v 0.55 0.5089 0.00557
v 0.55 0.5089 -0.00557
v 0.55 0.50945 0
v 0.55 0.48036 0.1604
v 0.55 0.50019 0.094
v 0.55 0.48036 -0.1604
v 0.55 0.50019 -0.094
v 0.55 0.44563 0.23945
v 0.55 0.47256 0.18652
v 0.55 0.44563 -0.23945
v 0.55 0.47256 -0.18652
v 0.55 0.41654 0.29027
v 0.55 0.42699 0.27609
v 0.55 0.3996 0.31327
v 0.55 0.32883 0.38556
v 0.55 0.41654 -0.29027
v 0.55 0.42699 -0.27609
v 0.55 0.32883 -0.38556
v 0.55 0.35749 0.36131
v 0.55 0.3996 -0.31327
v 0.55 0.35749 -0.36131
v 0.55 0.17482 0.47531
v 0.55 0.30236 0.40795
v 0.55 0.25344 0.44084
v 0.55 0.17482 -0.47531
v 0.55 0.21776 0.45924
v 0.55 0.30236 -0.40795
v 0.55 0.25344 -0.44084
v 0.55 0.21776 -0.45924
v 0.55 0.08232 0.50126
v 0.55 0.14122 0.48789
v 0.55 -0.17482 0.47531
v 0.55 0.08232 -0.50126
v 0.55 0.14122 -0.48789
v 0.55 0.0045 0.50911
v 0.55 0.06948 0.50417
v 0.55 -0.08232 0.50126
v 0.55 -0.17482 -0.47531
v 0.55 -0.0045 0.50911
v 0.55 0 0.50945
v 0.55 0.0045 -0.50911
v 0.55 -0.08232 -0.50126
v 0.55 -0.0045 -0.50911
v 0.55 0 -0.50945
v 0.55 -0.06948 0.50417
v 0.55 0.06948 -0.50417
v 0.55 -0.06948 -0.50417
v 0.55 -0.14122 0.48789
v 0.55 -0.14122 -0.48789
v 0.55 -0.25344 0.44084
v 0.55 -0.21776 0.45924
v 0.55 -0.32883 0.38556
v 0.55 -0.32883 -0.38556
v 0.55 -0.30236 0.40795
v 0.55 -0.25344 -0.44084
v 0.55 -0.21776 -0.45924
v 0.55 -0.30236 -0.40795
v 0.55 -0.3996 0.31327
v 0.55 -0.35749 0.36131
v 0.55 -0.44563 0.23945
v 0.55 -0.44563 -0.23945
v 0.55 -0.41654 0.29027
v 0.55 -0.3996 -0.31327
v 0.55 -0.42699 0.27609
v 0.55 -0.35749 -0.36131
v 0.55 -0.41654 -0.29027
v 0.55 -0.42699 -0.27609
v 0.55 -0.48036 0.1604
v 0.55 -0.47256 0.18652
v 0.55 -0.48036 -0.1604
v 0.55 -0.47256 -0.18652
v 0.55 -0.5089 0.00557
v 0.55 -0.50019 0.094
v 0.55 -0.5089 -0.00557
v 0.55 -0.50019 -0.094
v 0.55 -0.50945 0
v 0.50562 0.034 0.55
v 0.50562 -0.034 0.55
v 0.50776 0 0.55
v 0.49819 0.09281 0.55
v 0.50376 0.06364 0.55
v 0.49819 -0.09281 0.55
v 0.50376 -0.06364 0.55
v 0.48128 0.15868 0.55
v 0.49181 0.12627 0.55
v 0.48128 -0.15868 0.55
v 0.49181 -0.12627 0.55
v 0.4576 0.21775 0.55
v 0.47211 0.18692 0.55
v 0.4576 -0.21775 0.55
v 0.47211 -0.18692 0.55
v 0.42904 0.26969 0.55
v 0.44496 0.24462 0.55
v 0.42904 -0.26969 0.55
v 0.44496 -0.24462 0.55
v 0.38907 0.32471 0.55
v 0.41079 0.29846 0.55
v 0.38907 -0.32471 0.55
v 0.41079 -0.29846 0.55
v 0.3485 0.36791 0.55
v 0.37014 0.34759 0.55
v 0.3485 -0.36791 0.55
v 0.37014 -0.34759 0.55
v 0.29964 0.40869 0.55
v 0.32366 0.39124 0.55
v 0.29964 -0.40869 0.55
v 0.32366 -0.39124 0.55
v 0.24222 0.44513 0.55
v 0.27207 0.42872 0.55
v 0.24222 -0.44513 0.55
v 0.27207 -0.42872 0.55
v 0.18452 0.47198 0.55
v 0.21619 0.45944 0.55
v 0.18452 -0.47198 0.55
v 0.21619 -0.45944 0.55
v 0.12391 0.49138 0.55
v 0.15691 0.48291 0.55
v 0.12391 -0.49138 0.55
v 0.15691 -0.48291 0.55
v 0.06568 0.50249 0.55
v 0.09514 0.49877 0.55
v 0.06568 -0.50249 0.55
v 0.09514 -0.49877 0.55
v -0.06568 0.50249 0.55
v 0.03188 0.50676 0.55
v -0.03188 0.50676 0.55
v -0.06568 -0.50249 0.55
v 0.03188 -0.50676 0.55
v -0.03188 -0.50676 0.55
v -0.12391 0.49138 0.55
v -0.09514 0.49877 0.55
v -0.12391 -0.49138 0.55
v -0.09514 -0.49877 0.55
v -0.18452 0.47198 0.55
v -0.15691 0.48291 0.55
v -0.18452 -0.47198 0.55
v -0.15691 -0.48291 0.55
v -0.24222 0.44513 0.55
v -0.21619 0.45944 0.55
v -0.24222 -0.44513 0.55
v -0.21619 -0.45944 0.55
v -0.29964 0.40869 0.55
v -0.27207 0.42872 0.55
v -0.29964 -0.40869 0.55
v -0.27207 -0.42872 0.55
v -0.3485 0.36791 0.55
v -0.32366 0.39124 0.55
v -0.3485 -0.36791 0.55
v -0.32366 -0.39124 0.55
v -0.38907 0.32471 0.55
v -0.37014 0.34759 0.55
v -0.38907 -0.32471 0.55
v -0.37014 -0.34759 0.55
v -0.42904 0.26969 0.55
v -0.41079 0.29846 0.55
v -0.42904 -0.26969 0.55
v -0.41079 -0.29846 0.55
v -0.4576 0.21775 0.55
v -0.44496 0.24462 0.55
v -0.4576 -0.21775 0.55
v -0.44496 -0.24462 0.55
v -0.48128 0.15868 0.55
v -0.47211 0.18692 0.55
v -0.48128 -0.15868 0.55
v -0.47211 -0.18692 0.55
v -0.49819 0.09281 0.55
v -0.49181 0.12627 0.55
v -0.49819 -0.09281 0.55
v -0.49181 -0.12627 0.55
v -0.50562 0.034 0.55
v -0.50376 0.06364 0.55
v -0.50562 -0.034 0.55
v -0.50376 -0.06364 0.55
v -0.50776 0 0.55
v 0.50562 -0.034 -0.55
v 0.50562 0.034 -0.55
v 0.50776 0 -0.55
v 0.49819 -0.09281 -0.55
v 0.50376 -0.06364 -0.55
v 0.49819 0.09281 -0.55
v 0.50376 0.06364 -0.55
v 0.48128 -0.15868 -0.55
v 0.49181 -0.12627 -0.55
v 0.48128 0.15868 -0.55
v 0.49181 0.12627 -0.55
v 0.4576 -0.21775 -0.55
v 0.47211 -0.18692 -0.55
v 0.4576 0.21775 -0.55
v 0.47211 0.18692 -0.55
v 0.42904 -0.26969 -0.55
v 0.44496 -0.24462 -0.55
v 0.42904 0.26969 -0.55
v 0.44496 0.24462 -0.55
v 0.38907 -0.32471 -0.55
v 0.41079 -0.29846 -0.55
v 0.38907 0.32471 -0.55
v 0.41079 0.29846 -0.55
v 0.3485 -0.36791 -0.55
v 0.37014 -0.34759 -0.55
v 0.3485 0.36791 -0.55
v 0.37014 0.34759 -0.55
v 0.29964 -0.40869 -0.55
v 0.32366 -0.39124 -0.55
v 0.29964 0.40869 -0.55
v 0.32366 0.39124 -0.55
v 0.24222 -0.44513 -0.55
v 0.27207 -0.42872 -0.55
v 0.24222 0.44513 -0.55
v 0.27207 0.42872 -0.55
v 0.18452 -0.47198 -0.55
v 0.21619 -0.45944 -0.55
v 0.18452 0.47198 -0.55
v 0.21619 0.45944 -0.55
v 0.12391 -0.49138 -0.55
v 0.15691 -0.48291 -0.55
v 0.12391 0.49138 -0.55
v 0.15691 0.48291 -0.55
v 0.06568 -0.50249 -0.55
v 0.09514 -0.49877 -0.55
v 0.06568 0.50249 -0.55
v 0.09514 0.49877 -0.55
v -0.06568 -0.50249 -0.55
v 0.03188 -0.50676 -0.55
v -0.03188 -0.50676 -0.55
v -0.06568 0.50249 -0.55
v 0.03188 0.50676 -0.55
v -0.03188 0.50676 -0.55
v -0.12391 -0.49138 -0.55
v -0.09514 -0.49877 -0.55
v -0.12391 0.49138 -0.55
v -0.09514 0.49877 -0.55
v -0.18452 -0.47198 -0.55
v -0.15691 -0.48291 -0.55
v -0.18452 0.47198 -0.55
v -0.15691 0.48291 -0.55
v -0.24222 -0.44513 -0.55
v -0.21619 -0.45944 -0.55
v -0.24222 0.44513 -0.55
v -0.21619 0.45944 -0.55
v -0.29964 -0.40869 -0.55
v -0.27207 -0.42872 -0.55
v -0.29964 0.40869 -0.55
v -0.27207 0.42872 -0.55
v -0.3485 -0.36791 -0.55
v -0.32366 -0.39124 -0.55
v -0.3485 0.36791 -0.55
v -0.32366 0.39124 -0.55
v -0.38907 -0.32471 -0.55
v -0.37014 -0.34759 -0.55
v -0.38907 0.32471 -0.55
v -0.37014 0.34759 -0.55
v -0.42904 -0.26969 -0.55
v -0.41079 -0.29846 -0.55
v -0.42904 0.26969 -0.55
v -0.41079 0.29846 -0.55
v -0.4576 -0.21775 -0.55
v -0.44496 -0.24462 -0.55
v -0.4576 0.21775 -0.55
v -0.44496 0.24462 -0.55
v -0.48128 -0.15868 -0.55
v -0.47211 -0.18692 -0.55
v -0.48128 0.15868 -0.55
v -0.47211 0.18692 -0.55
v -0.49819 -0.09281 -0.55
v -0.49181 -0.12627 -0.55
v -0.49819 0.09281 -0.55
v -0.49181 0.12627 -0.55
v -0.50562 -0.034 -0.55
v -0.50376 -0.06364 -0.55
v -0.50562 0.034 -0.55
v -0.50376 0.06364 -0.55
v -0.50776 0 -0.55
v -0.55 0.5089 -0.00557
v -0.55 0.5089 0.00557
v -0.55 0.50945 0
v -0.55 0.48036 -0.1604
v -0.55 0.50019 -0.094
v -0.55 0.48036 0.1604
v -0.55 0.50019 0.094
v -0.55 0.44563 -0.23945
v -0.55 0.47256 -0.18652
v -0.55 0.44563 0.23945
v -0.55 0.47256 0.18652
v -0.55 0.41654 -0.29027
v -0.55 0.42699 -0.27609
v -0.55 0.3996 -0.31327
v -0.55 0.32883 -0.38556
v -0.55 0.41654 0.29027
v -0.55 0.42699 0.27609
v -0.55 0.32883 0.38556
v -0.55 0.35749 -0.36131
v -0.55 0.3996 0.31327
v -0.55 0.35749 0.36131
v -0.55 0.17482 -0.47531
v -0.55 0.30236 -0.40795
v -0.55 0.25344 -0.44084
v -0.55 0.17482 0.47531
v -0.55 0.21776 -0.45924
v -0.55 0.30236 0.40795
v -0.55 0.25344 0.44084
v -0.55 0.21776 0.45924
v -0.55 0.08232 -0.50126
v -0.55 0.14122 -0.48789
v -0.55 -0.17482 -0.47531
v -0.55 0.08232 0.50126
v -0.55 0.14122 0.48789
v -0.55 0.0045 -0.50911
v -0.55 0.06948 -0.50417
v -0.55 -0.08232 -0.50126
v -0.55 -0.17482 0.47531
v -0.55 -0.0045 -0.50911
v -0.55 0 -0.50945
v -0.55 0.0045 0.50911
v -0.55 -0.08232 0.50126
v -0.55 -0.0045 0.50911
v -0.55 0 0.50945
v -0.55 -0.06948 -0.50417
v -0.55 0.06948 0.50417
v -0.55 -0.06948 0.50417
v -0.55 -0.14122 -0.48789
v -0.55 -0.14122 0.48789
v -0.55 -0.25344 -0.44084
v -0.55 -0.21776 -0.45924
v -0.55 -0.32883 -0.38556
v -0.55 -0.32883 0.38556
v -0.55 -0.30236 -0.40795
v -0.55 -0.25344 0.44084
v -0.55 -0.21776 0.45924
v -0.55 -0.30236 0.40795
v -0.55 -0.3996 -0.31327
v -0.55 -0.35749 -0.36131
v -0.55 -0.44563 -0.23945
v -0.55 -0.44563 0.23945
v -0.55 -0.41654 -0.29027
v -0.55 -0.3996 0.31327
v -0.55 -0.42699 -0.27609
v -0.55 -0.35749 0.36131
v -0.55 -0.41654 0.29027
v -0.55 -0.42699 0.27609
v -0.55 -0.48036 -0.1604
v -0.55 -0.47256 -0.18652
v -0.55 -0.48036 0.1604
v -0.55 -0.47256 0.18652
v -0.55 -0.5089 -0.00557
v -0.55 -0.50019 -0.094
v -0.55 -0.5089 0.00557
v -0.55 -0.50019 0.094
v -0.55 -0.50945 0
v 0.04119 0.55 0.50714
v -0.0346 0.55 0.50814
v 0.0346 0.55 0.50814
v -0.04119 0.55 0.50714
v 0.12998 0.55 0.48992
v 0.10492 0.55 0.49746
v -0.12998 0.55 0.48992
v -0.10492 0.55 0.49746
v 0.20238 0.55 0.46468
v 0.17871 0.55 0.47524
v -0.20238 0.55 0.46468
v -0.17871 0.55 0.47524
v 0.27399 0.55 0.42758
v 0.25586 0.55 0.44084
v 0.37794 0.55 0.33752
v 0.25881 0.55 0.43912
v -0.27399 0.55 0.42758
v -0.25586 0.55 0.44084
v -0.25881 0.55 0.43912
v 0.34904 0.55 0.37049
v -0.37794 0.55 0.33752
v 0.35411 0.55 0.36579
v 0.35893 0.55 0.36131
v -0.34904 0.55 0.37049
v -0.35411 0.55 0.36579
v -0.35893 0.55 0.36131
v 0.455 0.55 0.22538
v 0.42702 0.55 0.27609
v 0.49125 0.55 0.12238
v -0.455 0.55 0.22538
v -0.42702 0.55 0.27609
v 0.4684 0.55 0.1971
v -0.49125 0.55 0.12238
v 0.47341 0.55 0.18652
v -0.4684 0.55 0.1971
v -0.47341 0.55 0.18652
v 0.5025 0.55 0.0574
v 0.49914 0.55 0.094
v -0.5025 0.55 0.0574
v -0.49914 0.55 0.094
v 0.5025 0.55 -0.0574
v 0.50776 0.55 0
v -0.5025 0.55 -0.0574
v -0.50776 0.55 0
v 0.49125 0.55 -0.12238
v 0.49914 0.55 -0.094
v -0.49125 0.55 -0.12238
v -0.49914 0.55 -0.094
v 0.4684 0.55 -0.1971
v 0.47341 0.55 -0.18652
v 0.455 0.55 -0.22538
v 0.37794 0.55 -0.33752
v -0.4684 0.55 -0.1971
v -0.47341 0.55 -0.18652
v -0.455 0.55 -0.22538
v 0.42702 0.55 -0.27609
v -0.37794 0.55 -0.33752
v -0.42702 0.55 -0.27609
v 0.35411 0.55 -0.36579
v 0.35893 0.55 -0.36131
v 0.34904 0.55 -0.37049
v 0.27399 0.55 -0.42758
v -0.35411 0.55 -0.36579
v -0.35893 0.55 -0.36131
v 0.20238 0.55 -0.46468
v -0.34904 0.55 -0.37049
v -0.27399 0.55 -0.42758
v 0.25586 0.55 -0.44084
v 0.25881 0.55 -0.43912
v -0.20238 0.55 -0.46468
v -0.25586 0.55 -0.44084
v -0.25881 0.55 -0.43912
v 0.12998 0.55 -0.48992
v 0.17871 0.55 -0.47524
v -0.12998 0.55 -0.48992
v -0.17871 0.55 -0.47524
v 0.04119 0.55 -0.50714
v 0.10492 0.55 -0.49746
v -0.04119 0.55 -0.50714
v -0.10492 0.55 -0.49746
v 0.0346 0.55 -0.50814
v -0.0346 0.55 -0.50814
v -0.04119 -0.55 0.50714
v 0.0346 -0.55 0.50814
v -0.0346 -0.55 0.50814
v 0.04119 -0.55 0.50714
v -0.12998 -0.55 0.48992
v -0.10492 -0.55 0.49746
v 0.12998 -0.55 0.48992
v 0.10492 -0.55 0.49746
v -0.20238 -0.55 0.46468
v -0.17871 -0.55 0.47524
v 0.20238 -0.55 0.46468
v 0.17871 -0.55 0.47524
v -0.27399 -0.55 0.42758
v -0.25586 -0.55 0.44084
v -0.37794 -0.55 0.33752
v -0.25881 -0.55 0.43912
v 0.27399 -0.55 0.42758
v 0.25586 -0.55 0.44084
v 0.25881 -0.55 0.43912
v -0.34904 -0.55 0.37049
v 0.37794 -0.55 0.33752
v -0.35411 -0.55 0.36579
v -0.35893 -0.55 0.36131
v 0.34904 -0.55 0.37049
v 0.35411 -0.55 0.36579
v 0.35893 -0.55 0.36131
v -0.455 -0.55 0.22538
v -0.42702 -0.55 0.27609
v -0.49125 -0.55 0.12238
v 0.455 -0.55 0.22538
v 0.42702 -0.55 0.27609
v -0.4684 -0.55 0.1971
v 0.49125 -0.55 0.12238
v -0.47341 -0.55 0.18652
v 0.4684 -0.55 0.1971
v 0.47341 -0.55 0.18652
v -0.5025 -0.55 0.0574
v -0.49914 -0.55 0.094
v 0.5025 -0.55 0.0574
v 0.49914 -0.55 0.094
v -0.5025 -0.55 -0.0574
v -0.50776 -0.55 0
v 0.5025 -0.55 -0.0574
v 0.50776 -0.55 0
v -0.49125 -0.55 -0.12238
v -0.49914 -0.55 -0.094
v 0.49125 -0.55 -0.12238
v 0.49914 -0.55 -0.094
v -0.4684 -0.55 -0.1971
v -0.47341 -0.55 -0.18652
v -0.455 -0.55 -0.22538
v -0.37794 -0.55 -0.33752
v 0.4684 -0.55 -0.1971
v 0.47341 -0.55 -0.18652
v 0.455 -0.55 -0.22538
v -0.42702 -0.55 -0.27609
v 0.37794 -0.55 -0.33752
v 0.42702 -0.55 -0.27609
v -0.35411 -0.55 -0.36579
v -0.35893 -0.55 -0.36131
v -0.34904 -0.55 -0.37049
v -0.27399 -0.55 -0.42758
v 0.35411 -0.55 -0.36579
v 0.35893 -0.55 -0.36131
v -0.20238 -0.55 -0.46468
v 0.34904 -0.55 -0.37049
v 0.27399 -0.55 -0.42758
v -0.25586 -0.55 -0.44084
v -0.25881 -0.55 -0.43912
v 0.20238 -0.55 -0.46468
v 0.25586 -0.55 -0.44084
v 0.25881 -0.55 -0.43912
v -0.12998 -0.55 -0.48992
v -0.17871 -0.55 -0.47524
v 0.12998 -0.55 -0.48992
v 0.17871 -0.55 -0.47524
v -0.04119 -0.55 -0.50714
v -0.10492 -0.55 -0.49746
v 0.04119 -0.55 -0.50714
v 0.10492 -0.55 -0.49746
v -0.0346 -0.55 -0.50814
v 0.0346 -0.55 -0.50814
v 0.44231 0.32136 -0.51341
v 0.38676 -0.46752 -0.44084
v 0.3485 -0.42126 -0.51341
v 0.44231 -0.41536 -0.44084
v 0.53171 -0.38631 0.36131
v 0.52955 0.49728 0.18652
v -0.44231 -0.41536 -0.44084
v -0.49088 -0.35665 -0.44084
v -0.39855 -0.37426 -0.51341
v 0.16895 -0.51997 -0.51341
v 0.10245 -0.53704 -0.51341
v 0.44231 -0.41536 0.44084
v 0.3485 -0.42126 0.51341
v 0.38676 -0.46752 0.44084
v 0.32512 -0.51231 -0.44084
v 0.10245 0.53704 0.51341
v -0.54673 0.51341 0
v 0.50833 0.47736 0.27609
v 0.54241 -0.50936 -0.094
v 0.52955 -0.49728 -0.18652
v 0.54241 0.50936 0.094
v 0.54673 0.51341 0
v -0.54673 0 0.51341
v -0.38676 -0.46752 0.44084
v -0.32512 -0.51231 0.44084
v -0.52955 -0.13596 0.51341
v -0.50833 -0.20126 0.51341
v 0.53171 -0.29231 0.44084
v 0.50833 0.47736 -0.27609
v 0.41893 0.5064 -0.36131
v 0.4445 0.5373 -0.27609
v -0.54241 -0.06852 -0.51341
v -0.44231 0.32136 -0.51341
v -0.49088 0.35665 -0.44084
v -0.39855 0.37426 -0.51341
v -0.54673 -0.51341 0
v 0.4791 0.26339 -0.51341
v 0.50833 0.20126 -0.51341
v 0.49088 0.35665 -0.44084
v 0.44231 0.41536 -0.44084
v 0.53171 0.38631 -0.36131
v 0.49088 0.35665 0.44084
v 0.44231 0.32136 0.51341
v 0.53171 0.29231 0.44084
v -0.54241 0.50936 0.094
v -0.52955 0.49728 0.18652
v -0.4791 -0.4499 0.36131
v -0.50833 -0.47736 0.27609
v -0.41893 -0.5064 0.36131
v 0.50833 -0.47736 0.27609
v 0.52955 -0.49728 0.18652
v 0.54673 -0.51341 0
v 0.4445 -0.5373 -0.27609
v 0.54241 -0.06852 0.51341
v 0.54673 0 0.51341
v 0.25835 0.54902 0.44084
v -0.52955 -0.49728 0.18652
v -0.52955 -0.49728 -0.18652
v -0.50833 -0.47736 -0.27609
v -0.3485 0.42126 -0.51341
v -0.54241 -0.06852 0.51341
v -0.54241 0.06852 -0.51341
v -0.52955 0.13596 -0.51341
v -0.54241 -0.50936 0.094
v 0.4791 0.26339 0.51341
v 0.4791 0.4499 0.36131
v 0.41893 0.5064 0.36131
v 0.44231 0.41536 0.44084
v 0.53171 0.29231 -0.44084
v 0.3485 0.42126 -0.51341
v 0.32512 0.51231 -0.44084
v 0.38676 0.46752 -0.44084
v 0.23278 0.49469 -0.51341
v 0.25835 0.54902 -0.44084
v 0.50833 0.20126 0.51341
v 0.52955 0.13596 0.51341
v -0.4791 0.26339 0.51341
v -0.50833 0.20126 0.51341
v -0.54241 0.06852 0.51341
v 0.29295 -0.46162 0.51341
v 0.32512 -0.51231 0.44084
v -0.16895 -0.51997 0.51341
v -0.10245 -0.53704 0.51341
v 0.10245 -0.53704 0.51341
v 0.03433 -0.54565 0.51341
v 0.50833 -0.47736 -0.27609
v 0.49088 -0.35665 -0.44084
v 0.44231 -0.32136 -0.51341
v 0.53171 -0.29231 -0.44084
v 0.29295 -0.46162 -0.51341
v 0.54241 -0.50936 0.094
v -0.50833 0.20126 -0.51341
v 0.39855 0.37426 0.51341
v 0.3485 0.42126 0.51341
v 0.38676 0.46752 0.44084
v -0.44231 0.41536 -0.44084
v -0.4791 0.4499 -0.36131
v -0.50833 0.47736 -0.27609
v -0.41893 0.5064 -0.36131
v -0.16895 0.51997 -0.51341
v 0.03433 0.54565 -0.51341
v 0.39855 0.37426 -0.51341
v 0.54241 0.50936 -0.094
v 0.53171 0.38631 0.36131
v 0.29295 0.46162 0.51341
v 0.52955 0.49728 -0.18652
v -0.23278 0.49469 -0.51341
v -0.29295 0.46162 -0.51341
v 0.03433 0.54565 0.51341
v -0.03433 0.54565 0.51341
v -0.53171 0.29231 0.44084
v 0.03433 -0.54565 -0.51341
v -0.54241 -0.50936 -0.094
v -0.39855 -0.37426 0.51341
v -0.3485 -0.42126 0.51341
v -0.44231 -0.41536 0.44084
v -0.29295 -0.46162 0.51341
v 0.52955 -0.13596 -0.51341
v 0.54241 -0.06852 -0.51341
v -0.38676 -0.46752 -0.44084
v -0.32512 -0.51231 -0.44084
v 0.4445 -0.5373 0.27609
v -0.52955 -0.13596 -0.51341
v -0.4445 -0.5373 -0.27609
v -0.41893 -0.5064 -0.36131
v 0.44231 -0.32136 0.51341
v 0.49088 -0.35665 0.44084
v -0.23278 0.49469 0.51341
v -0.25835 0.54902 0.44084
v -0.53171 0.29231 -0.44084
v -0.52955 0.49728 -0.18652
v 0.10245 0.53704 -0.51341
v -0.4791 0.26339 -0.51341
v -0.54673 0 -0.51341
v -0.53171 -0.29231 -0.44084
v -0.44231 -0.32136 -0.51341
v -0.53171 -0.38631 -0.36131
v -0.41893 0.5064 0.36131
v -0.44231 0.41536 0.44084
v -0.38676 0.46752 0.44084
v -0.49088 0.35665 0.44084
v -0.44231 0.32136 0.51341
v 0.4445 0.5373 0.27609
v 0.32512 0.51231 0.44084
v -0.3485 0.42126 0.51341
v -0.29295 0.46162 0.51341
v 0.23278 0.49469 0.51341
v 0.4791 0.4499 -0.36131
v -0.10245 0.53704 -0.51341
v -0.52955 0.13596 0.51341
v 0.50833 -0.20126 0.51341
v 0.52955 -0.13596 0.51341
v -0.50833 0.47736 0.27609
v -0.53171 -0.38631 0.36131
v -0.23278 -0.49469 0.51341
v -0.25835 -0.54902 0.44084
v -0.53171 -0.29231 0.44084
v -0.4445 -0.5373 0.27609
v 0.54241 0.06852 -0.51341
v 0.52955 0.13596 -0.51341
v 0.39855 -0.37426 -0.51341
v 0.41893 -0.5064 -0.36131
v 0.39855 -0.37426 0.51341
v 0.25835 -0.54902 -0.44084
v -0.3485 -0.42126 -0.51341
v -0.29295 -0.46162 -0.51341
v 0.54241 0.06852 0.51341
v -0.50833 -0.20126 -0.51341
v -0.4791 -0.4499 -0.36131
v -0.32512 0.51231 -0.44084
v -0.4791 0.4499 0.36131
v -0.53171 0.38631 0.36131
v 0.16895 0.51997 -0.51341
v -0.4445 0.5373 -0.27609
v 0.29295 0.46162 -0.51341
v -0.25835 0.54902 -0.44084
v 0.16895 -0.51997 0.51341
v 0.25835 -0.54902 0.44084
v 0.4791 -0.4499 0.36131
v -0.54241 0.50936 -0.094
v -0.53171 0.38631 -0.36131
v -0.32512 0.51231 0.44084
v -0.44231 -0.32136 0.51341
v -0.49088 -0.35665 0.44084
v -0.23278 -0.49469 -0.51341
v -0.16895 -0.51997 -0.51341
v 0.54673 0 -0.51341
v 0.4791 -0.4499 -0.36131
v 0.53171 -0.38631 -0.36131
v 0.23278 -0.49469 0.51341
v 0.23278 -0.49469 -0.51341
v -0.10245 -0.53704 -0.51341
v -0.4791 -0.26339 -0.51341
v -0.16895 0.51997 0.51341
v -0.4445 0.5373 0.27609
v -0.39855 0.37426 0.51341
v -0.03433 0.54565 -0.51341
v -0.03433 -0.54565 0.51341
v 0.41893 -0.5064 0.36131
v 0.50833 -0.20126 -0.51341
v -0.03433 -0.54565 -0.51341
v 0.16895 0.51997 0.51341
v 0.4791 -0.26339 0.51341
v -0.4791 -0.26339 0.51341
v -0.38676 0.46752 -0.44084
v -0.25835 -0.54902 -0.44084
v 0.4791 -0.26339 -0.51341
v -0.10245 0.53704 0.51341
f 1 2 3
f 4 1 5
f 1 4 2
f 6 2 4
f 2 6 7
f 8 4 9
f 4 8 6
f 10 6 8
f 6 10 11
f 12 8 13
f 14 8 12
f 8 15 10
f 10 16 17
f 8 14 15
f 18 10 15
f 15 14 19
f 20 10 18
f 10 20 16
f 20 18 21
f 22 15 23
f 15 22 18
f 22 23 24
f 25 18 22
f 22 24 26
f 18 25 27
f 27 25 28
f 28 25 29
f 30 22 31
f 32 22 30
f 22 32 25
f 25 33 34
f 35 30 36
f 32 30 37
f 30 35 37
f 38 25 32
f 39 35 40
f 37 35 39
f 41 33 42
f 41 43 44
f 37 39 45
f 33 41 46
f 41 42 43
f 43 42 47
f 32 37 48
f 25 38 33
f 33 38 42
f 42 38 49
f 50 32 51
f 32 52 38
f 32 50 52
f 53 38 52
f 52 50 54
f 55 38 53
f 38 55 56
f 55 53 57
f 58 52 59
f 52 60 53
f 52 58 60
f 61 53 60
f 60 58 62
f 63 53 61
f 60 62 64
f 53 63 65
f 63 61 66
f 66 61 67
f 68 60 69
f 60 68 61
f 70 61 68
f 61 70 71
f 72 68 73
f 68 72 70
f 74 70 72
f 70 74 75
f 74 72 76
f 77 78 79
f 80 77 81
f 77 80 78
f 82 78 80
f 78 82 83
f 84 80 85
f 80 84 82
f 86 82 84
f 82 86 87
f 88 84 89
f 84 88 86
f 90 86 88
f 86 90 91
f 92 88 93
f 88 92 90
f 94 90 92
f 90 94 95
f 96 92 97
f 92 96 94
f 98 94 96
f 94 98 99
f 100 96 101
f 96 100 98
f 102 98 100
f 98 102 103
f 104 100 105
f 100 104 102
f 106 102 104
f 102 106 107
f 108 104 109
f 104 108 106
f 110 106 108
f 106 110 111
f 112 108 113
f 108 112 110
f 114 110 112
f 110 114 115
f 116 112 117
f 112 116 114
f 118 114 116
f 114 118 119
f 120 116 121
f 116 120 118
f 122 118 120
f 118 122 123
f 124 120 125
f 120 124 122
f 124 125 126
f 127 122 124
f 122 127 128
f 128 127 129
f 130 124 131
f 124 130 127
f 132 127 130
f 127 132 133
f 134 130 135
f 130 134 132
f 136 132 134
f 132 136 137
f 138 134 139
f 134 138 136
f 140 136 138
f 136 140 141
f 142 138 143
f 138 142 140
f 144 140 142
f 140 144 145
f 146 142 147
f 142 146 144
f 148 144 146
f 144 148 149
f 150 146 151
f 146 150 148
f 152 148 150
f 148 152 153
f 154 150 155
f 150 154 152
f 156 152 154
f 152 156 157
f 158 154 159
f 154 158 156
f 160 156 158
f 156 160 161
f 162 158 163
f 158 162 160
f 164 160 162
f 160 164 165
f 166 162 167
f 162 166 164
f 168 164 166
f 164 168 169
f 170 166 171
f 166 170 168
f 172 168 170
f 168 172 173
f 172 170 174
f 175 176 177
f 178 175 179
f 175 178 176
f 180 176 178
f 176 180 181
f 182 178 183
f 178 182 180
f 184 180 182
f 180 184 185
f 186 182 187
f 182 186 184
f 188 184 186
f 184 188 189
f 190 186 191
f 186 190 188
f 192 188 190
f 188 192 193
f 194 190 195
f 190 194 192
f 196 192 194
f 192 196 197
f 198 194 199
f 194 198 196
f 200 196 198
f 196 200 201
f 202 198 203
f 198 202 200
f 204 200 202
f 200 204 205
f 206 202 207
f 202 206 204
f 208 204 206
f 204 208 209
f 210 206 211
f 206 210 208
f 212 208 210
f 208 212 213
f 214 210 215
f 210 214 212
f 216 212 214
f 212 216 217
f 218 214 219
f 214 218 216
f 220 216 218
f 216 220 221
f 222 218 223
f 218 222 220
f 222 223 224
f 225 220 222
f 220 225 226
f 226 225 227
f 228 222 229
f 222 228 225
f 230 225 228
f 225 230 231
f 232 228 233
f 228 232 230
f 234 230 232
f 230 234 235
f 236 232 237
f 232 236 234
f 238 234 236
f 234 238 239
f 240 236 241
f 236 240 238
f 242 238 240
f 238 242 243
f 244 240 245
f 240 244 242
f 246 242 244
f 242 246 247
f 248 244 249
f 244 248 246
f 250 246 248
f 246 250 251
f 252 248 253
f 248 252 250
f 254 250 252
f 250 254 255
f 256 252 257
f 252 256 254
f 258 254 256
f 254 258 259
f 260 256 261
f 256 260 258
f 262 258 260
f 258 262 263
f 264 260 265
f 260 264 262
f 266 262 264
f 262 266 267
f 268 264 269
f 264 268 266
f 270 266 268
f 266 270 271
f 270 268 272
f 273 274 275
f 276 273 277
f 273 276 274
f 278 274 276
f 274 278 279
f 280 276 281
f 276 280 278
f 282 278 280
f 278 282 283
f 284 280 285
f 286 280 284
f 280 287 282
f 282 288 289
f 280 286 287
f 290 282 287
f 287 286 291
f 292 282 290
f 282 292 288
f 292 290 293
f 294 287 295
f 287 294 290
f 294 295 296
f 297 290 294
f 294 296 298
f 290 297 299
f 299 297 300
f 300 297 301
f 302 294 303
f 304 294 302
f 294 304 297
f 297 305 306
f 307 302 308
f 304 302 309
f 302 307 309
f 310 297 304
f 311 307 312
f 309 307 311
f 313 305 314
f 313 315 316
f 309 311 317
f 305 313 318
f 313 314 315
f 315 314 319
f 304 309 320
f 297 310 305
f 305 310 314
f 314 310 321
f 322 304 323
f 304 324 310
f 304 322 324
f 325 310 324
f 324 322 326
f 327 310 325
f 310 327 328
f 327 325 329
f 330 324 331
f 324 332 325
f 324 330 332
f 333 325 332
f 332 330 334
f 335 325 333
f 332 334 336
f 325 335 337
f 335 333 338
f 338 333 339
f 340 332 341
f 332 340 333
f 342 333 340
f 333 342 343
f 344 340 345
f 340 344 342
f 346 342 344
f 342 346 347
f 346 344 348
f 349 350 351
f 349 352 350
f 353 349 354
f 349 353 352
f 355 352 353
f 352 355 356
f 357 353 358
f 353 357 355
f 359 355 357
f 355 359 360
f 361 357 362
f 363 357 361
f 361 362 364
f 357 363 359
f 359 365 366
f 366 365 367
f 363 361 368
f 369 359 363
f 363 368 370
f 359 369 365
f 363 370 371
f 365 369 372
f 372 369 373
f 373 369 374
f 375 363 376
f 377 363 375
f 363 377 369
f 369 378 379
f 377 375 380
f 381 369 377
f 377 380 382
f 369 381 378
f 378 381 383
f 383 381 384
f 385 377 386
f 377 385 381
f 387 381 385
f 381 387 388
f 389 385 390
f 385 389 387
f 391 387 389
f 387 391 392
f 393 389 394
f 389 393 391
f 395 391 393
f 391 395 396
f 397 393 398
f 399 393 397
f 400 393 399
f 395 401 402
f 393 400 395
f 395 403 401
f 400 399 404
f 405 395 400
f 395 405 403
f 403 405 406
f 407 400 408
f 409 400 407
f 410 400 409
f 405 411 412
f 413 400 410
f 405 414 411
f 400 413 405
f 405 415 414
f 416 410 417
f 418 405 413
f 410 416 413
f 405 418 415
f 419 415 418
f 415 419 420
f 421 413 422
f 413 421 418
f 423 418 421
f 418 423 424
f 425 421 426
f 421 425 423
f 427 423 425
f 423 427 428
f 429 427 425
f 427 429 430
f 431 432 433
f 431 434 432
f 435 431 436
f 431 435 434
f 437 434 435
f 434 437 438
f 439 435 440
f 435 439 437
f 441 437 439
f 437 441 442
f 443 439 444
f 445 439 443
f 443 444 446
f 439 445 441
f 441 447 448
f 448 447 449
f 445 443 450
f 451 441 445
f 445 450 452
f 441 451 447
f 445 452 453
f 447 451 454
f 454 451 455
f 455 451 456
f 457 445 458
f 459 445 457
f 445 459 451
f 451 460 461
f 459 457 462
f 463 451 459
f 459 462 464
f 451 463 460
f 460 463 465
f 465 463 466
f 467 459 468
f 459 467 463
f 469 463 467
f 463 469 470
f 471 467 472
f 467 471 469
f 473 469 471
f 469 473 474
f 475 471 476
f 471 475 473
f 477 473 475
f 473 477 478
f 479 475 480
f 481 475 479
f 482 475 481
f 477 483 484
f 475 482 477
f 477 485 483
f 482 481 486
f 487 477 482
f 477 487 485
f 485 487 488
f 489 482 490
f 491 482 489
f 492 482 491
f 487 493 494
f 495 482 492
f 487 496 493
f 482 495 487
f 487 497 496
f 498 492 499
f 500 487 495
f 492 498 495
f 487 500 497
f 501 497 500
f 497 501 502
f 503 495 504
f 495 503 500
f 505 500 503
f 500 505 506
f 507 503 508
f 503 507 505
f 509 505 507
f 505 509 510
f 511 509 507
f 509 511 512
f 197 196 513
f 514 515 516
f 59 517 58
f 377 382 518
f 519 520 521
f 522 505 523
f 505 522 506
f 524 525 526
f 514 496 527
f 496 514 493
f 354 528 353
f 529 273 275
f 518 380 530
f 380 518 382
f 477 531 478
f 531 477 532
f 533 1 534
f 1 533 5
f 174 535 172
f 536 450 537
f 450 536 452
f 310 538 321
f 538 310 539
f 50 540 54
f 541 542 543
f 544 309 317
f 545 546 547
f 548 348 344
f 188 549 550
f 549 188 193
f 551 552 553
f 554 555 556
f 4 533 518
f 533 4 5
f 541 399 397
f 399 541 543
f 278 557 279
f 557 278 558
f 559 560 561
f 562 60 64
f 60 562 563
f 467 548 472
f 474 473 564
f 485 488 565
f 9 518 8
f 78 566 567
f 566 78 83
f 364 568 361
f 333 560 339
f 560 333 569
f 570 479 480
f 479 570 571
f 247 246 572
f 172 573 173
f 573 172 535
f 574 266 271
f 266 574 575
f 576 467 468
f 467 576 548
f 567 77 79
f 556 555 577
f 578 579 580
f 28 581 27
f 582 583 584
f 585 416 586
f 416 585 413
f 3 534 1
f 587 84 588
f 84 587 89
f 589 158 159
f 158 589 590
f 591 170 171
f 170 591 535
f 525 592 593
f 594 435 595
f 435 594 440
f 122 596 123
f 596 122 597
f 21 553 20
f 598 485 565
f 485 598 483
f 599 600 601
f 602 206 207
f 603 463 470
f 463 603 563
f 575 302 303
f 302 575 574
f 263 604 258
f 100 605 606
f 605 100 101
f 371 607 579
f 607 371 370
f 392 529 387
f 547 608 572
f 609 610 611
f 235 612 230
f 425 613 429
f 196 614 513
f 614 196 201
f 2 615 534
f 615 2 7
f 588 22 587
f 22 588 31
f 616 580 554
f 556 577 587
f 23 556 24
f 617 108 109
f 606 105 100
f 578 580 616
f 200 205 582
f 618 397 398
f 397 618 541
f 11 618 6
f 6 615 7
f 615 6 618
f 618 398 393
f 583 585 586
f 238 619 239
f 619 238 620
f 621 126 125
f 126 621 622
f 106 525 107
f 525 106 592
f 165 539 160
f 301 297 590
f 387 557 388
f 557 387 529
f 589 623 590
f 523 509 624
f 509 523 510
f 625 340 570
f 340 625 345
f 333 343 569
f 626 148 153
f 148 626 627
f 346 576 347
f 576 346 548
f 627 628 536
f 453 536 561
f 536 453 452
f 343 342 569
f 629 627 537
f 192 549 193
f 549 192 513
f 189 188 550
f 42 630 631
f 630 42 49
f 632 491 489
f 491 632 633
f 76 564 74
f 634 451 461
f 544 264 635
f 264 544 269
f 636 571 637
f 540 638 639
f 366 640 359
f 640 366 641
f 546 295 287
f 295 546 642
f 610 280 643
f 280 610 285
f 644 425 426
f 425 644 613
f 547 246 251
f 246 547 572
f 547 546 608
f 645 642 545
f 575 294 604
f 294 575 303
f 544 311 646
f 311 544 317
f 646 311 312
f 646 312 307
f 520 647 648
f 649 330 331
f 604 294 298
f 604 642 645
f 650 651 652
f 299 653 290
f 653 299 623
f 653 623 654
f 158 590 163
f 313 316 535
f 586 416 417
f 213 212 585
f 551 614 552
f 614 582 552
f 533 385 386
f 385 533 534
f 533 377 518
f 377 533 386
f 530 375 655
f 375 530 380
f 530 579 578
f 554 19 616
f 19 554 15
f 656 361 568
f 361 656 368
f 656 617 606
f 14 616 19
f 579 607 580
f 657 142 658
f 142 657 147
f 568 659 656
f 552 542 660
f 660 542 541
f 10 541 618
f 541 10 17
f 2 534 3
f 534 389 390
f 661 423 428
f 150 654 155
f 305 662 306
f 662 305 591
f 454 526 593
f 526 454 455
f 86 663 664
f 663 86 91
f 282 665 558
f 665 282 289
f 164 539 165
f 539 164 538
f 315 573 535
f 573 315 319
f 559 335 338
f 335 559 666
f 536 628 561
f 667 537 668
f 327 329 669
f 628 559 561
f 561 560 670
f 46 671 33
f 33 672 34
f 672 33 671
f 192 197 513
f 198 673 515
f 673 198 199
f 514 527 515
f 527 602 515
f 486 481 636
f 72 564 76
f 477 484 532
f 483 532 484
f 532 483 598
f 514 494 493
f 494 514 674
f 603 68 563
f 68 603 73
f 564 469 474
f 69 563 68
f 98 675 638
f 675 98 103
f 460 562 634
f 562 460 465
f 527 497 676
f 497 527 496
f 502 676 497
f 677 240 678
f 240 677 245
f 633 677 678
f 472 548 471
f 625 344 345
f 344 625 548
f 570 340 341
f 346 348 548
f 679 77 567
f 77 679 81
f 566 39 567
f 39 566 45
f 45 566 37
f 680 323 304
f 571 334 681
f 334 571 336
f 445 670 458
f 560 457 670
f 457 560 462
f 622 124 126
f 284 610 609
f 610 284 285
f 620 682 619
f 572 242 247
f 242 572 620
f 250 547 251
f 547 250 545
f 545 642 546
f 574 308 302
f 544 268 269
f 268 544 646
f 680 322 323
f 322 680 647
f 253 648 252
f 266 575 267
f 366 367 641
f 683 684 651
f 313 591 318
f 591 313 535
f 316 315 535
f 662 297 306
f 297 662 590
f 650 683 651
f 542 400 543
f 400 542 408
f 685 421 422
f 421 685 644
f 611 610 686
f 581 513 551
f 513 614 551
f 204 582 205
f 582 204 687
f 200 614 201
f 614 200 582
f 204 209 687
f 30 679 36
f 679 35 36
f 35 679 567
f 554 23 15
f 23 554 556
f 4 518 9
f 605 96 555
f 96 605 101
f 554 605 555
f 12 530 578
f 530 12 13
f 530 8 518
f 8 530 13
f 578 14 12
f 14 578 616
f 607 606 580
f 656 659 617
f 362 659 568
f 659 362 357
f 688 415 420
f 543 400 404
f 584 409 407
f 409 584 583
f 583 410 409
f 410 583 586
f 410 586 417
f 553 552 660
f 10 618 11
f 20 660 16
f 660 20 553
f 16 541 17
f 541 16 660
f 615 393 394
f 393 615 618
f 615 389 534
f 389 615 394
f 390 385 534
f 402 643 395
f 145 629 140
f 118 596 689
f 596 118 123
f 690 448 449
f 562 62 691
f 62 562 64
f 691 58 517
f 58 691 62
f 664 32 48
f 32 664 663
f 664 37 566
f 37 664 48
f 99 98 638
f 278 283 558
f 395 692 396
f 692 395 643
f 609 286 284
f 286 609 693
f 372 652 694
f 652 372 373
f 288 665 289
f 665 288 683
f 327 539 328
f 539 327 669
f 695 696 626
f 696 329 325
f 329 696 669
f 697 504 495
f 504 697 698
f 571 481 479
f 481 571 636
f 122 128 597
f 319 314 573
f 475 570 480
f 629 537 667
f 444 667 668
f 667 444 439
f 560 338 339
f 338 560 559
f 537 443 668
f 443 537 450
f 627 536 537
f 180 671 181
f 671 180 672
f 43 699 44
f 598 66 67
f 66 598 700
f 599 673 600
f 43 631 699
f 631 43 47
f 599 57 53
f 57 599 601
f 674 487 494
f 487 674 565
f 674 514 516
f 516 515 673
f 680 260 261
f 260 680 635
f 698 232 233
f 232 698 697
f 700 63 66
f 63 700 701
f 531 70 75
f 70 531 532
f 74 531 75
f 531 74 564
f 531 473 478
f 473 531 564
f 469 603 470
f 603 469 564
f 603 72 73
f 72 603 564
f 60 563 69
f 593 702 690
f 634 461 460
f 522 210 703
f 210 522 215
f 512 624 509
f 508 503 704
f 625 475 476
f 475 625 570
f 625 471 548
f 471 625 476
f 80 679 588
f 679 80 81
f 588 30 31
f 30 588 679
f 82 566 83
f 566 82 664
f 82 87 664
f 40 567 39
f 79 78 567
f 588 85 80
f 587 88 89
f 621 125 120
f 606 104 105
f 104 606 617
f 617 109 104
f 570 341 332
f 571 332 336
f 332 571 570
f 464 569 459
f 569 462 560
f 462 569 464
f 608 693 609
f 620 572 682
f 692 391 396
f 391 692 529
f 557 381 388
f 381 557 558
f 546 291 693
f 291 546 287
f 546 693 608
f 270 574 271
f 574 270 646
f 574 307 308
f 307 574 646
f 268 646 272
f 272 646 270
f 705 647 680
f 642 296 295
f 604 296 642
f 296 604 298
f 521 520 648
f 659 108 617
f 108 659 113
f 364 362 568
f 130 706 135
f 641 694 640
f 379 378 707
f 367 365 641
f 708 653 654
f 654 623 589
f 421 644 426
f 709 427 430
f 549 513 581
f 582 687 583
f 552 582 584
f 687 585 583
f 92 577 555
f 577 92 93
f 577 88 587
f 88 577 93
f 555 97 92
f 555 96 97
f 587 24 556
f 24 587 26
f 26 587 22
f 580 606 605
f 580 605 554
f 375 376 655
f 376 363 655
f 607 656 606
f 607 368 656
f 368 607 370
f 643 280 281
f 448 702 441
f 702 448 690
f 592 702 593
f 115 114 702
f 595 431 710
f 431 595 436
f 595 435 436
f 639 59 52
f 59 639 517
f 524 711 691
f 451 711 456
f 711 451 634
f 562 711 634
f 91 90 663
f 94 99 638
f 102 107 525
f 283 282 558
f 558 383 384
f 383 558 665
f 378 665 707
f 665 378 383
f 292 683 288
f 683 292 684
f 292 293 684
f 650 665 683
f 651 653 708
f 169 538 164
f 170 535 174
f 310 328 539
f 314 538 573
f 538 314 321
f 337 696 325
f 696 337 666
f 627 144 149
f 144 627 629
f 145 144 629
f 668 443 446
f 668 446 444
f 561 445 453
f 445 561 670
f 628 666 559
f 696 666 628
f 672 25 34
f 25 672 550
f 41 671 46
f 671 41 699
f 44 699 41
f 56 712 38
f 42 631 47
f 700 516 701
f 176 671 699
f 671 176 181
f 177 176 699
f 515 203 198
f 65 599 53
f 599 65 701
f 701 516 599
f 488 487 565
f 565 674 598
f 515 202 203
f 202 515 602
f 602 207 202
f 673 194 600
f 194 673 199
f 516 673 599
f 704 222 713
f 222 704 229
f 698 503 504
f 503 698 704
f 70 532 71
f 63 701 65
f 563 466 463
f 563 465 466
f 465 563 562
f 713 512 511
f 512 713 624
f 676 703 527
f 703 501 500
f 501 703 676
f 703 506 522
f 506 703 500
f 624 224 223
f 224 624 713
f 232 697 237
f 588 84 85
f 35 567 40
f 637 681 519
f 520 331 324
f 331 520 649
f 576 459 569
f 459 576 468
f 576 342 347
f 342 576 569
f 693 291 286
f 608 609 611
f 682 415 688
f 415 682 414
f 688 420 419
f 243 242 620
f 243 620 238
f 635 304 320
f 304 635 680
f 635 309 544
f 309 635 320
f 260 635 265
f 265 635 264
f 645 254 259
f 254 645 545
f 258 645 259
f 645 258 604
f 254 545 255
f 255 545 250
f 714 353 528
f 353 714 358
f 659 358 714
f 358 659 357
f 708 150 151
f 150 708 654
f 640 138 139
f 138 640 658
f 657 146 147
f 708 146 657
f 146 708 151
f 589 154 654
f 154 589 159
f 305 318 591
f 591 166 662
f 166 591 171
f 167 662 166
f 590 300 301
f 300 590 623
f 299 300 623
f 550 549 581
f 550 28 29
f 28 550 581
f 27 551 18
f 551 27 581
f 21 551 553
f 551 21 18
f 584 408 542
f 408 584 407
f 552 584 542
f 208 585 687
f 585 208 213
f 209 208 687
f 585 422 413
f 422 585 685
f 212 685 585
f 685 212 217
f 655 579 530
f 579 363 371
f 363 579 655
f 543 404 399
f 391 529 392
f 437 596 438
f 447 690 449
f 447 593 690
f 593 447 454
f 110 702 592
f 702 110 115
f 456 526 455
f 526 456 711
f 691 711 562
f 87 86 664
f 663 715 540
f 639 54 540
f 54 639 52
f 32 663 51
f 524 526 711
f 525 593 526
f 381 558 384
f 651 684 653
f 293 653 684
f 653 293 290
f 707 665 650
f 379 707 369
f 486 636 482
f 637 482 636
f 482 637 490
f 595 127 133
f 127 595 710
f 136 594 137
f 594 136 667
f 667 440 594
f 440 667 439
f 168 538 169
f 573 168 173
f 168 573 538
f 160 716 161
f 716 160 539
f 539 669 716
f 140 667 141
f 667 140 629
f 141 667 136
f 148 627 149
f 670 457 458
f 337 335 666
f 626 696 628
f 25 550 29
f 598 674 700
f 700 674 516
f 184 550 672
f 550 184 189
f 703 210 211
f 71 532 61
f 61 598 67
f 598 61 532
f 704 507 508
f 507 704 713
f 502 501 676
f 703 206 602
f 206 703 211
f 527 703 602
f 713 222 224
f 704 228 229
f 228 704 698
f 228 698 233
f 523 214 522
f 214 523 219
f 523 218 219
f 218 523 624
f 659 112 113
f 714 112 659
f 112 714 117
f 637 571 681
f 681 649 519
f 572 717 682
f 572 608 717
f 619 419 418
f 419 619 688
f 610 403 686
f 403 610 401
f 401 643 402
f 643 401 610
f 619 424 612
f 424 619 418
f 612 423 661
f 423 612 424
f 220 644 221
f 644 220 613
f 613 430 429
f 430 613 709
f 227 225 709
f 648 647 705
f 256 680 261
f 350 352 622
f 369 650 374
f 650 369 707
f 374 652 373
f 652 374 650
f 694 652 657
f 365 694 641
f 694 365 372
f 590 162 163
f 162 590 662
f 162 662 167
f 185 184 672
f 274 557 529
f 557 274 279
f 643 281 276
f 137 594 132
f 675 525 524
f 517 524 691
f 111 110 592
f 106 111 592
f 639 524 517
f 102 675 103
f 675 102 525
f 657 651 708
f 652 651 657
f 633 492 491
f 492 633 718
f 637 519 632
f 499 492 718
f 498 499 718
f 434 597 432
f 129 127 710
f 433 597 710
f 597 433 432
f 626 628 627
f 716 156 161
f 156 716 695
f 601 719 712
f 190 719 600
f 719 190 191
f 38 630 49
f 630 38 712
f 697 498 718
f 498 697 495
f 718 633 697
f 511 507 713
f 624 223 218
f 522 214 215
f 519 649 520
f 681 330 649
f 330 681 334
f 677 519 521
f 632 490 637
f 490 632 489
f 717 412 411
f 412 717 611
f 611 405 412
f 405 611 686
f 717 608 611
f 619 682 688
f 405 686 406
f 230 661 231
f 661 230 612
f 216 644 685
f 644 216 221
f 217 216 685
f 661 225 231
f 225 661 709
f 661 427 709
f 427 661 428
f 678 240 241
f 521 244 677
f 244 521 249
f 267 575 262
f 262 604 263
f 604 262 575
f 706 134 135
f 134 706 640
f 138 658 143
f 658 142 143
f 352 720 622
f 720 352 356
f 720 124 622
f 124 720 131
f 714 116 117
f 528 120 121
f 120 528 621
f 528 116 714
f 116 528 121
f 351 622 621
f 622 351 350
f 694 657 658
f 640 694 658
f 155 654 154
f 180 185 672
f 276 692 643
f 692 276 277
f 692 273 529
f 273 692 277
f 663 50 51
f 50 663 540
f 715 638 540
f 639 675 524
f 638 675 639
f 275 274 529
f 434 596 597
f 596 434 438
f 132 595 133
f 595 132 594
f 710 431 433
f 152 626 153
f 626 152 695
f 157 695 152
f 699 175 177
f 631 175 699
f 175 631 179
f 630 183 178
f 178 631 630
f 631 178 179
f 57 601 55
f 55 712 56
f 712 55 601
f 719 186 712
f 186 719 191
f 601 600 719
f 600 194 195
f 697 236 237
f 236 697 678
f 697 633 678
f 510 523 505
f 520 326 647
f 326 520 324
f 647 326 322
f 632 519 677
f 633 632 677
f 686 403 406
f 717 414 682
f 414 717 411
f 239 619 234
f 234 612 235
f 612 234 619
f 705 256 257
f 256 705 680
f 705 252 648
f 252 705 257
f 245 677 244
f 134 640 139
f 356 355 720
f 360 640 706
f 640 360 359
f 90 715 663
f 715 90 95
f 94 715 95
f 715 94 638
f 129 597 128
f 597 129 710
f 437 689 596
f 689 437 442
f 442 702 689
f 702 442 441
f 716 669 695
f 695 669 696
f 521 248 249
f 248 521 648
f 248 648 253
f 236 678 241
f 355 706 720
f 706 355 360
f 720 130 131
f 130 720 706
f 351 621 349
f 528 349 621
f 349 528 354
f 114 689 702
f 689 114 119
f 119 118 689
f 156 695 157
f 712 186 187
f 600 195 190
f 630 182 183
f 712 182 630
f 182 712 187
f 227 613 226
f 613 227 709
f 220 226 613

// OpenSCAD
intersection() {   $fn = 50;
    cube(1.10, center=true);
    sphere(0.75);
}
